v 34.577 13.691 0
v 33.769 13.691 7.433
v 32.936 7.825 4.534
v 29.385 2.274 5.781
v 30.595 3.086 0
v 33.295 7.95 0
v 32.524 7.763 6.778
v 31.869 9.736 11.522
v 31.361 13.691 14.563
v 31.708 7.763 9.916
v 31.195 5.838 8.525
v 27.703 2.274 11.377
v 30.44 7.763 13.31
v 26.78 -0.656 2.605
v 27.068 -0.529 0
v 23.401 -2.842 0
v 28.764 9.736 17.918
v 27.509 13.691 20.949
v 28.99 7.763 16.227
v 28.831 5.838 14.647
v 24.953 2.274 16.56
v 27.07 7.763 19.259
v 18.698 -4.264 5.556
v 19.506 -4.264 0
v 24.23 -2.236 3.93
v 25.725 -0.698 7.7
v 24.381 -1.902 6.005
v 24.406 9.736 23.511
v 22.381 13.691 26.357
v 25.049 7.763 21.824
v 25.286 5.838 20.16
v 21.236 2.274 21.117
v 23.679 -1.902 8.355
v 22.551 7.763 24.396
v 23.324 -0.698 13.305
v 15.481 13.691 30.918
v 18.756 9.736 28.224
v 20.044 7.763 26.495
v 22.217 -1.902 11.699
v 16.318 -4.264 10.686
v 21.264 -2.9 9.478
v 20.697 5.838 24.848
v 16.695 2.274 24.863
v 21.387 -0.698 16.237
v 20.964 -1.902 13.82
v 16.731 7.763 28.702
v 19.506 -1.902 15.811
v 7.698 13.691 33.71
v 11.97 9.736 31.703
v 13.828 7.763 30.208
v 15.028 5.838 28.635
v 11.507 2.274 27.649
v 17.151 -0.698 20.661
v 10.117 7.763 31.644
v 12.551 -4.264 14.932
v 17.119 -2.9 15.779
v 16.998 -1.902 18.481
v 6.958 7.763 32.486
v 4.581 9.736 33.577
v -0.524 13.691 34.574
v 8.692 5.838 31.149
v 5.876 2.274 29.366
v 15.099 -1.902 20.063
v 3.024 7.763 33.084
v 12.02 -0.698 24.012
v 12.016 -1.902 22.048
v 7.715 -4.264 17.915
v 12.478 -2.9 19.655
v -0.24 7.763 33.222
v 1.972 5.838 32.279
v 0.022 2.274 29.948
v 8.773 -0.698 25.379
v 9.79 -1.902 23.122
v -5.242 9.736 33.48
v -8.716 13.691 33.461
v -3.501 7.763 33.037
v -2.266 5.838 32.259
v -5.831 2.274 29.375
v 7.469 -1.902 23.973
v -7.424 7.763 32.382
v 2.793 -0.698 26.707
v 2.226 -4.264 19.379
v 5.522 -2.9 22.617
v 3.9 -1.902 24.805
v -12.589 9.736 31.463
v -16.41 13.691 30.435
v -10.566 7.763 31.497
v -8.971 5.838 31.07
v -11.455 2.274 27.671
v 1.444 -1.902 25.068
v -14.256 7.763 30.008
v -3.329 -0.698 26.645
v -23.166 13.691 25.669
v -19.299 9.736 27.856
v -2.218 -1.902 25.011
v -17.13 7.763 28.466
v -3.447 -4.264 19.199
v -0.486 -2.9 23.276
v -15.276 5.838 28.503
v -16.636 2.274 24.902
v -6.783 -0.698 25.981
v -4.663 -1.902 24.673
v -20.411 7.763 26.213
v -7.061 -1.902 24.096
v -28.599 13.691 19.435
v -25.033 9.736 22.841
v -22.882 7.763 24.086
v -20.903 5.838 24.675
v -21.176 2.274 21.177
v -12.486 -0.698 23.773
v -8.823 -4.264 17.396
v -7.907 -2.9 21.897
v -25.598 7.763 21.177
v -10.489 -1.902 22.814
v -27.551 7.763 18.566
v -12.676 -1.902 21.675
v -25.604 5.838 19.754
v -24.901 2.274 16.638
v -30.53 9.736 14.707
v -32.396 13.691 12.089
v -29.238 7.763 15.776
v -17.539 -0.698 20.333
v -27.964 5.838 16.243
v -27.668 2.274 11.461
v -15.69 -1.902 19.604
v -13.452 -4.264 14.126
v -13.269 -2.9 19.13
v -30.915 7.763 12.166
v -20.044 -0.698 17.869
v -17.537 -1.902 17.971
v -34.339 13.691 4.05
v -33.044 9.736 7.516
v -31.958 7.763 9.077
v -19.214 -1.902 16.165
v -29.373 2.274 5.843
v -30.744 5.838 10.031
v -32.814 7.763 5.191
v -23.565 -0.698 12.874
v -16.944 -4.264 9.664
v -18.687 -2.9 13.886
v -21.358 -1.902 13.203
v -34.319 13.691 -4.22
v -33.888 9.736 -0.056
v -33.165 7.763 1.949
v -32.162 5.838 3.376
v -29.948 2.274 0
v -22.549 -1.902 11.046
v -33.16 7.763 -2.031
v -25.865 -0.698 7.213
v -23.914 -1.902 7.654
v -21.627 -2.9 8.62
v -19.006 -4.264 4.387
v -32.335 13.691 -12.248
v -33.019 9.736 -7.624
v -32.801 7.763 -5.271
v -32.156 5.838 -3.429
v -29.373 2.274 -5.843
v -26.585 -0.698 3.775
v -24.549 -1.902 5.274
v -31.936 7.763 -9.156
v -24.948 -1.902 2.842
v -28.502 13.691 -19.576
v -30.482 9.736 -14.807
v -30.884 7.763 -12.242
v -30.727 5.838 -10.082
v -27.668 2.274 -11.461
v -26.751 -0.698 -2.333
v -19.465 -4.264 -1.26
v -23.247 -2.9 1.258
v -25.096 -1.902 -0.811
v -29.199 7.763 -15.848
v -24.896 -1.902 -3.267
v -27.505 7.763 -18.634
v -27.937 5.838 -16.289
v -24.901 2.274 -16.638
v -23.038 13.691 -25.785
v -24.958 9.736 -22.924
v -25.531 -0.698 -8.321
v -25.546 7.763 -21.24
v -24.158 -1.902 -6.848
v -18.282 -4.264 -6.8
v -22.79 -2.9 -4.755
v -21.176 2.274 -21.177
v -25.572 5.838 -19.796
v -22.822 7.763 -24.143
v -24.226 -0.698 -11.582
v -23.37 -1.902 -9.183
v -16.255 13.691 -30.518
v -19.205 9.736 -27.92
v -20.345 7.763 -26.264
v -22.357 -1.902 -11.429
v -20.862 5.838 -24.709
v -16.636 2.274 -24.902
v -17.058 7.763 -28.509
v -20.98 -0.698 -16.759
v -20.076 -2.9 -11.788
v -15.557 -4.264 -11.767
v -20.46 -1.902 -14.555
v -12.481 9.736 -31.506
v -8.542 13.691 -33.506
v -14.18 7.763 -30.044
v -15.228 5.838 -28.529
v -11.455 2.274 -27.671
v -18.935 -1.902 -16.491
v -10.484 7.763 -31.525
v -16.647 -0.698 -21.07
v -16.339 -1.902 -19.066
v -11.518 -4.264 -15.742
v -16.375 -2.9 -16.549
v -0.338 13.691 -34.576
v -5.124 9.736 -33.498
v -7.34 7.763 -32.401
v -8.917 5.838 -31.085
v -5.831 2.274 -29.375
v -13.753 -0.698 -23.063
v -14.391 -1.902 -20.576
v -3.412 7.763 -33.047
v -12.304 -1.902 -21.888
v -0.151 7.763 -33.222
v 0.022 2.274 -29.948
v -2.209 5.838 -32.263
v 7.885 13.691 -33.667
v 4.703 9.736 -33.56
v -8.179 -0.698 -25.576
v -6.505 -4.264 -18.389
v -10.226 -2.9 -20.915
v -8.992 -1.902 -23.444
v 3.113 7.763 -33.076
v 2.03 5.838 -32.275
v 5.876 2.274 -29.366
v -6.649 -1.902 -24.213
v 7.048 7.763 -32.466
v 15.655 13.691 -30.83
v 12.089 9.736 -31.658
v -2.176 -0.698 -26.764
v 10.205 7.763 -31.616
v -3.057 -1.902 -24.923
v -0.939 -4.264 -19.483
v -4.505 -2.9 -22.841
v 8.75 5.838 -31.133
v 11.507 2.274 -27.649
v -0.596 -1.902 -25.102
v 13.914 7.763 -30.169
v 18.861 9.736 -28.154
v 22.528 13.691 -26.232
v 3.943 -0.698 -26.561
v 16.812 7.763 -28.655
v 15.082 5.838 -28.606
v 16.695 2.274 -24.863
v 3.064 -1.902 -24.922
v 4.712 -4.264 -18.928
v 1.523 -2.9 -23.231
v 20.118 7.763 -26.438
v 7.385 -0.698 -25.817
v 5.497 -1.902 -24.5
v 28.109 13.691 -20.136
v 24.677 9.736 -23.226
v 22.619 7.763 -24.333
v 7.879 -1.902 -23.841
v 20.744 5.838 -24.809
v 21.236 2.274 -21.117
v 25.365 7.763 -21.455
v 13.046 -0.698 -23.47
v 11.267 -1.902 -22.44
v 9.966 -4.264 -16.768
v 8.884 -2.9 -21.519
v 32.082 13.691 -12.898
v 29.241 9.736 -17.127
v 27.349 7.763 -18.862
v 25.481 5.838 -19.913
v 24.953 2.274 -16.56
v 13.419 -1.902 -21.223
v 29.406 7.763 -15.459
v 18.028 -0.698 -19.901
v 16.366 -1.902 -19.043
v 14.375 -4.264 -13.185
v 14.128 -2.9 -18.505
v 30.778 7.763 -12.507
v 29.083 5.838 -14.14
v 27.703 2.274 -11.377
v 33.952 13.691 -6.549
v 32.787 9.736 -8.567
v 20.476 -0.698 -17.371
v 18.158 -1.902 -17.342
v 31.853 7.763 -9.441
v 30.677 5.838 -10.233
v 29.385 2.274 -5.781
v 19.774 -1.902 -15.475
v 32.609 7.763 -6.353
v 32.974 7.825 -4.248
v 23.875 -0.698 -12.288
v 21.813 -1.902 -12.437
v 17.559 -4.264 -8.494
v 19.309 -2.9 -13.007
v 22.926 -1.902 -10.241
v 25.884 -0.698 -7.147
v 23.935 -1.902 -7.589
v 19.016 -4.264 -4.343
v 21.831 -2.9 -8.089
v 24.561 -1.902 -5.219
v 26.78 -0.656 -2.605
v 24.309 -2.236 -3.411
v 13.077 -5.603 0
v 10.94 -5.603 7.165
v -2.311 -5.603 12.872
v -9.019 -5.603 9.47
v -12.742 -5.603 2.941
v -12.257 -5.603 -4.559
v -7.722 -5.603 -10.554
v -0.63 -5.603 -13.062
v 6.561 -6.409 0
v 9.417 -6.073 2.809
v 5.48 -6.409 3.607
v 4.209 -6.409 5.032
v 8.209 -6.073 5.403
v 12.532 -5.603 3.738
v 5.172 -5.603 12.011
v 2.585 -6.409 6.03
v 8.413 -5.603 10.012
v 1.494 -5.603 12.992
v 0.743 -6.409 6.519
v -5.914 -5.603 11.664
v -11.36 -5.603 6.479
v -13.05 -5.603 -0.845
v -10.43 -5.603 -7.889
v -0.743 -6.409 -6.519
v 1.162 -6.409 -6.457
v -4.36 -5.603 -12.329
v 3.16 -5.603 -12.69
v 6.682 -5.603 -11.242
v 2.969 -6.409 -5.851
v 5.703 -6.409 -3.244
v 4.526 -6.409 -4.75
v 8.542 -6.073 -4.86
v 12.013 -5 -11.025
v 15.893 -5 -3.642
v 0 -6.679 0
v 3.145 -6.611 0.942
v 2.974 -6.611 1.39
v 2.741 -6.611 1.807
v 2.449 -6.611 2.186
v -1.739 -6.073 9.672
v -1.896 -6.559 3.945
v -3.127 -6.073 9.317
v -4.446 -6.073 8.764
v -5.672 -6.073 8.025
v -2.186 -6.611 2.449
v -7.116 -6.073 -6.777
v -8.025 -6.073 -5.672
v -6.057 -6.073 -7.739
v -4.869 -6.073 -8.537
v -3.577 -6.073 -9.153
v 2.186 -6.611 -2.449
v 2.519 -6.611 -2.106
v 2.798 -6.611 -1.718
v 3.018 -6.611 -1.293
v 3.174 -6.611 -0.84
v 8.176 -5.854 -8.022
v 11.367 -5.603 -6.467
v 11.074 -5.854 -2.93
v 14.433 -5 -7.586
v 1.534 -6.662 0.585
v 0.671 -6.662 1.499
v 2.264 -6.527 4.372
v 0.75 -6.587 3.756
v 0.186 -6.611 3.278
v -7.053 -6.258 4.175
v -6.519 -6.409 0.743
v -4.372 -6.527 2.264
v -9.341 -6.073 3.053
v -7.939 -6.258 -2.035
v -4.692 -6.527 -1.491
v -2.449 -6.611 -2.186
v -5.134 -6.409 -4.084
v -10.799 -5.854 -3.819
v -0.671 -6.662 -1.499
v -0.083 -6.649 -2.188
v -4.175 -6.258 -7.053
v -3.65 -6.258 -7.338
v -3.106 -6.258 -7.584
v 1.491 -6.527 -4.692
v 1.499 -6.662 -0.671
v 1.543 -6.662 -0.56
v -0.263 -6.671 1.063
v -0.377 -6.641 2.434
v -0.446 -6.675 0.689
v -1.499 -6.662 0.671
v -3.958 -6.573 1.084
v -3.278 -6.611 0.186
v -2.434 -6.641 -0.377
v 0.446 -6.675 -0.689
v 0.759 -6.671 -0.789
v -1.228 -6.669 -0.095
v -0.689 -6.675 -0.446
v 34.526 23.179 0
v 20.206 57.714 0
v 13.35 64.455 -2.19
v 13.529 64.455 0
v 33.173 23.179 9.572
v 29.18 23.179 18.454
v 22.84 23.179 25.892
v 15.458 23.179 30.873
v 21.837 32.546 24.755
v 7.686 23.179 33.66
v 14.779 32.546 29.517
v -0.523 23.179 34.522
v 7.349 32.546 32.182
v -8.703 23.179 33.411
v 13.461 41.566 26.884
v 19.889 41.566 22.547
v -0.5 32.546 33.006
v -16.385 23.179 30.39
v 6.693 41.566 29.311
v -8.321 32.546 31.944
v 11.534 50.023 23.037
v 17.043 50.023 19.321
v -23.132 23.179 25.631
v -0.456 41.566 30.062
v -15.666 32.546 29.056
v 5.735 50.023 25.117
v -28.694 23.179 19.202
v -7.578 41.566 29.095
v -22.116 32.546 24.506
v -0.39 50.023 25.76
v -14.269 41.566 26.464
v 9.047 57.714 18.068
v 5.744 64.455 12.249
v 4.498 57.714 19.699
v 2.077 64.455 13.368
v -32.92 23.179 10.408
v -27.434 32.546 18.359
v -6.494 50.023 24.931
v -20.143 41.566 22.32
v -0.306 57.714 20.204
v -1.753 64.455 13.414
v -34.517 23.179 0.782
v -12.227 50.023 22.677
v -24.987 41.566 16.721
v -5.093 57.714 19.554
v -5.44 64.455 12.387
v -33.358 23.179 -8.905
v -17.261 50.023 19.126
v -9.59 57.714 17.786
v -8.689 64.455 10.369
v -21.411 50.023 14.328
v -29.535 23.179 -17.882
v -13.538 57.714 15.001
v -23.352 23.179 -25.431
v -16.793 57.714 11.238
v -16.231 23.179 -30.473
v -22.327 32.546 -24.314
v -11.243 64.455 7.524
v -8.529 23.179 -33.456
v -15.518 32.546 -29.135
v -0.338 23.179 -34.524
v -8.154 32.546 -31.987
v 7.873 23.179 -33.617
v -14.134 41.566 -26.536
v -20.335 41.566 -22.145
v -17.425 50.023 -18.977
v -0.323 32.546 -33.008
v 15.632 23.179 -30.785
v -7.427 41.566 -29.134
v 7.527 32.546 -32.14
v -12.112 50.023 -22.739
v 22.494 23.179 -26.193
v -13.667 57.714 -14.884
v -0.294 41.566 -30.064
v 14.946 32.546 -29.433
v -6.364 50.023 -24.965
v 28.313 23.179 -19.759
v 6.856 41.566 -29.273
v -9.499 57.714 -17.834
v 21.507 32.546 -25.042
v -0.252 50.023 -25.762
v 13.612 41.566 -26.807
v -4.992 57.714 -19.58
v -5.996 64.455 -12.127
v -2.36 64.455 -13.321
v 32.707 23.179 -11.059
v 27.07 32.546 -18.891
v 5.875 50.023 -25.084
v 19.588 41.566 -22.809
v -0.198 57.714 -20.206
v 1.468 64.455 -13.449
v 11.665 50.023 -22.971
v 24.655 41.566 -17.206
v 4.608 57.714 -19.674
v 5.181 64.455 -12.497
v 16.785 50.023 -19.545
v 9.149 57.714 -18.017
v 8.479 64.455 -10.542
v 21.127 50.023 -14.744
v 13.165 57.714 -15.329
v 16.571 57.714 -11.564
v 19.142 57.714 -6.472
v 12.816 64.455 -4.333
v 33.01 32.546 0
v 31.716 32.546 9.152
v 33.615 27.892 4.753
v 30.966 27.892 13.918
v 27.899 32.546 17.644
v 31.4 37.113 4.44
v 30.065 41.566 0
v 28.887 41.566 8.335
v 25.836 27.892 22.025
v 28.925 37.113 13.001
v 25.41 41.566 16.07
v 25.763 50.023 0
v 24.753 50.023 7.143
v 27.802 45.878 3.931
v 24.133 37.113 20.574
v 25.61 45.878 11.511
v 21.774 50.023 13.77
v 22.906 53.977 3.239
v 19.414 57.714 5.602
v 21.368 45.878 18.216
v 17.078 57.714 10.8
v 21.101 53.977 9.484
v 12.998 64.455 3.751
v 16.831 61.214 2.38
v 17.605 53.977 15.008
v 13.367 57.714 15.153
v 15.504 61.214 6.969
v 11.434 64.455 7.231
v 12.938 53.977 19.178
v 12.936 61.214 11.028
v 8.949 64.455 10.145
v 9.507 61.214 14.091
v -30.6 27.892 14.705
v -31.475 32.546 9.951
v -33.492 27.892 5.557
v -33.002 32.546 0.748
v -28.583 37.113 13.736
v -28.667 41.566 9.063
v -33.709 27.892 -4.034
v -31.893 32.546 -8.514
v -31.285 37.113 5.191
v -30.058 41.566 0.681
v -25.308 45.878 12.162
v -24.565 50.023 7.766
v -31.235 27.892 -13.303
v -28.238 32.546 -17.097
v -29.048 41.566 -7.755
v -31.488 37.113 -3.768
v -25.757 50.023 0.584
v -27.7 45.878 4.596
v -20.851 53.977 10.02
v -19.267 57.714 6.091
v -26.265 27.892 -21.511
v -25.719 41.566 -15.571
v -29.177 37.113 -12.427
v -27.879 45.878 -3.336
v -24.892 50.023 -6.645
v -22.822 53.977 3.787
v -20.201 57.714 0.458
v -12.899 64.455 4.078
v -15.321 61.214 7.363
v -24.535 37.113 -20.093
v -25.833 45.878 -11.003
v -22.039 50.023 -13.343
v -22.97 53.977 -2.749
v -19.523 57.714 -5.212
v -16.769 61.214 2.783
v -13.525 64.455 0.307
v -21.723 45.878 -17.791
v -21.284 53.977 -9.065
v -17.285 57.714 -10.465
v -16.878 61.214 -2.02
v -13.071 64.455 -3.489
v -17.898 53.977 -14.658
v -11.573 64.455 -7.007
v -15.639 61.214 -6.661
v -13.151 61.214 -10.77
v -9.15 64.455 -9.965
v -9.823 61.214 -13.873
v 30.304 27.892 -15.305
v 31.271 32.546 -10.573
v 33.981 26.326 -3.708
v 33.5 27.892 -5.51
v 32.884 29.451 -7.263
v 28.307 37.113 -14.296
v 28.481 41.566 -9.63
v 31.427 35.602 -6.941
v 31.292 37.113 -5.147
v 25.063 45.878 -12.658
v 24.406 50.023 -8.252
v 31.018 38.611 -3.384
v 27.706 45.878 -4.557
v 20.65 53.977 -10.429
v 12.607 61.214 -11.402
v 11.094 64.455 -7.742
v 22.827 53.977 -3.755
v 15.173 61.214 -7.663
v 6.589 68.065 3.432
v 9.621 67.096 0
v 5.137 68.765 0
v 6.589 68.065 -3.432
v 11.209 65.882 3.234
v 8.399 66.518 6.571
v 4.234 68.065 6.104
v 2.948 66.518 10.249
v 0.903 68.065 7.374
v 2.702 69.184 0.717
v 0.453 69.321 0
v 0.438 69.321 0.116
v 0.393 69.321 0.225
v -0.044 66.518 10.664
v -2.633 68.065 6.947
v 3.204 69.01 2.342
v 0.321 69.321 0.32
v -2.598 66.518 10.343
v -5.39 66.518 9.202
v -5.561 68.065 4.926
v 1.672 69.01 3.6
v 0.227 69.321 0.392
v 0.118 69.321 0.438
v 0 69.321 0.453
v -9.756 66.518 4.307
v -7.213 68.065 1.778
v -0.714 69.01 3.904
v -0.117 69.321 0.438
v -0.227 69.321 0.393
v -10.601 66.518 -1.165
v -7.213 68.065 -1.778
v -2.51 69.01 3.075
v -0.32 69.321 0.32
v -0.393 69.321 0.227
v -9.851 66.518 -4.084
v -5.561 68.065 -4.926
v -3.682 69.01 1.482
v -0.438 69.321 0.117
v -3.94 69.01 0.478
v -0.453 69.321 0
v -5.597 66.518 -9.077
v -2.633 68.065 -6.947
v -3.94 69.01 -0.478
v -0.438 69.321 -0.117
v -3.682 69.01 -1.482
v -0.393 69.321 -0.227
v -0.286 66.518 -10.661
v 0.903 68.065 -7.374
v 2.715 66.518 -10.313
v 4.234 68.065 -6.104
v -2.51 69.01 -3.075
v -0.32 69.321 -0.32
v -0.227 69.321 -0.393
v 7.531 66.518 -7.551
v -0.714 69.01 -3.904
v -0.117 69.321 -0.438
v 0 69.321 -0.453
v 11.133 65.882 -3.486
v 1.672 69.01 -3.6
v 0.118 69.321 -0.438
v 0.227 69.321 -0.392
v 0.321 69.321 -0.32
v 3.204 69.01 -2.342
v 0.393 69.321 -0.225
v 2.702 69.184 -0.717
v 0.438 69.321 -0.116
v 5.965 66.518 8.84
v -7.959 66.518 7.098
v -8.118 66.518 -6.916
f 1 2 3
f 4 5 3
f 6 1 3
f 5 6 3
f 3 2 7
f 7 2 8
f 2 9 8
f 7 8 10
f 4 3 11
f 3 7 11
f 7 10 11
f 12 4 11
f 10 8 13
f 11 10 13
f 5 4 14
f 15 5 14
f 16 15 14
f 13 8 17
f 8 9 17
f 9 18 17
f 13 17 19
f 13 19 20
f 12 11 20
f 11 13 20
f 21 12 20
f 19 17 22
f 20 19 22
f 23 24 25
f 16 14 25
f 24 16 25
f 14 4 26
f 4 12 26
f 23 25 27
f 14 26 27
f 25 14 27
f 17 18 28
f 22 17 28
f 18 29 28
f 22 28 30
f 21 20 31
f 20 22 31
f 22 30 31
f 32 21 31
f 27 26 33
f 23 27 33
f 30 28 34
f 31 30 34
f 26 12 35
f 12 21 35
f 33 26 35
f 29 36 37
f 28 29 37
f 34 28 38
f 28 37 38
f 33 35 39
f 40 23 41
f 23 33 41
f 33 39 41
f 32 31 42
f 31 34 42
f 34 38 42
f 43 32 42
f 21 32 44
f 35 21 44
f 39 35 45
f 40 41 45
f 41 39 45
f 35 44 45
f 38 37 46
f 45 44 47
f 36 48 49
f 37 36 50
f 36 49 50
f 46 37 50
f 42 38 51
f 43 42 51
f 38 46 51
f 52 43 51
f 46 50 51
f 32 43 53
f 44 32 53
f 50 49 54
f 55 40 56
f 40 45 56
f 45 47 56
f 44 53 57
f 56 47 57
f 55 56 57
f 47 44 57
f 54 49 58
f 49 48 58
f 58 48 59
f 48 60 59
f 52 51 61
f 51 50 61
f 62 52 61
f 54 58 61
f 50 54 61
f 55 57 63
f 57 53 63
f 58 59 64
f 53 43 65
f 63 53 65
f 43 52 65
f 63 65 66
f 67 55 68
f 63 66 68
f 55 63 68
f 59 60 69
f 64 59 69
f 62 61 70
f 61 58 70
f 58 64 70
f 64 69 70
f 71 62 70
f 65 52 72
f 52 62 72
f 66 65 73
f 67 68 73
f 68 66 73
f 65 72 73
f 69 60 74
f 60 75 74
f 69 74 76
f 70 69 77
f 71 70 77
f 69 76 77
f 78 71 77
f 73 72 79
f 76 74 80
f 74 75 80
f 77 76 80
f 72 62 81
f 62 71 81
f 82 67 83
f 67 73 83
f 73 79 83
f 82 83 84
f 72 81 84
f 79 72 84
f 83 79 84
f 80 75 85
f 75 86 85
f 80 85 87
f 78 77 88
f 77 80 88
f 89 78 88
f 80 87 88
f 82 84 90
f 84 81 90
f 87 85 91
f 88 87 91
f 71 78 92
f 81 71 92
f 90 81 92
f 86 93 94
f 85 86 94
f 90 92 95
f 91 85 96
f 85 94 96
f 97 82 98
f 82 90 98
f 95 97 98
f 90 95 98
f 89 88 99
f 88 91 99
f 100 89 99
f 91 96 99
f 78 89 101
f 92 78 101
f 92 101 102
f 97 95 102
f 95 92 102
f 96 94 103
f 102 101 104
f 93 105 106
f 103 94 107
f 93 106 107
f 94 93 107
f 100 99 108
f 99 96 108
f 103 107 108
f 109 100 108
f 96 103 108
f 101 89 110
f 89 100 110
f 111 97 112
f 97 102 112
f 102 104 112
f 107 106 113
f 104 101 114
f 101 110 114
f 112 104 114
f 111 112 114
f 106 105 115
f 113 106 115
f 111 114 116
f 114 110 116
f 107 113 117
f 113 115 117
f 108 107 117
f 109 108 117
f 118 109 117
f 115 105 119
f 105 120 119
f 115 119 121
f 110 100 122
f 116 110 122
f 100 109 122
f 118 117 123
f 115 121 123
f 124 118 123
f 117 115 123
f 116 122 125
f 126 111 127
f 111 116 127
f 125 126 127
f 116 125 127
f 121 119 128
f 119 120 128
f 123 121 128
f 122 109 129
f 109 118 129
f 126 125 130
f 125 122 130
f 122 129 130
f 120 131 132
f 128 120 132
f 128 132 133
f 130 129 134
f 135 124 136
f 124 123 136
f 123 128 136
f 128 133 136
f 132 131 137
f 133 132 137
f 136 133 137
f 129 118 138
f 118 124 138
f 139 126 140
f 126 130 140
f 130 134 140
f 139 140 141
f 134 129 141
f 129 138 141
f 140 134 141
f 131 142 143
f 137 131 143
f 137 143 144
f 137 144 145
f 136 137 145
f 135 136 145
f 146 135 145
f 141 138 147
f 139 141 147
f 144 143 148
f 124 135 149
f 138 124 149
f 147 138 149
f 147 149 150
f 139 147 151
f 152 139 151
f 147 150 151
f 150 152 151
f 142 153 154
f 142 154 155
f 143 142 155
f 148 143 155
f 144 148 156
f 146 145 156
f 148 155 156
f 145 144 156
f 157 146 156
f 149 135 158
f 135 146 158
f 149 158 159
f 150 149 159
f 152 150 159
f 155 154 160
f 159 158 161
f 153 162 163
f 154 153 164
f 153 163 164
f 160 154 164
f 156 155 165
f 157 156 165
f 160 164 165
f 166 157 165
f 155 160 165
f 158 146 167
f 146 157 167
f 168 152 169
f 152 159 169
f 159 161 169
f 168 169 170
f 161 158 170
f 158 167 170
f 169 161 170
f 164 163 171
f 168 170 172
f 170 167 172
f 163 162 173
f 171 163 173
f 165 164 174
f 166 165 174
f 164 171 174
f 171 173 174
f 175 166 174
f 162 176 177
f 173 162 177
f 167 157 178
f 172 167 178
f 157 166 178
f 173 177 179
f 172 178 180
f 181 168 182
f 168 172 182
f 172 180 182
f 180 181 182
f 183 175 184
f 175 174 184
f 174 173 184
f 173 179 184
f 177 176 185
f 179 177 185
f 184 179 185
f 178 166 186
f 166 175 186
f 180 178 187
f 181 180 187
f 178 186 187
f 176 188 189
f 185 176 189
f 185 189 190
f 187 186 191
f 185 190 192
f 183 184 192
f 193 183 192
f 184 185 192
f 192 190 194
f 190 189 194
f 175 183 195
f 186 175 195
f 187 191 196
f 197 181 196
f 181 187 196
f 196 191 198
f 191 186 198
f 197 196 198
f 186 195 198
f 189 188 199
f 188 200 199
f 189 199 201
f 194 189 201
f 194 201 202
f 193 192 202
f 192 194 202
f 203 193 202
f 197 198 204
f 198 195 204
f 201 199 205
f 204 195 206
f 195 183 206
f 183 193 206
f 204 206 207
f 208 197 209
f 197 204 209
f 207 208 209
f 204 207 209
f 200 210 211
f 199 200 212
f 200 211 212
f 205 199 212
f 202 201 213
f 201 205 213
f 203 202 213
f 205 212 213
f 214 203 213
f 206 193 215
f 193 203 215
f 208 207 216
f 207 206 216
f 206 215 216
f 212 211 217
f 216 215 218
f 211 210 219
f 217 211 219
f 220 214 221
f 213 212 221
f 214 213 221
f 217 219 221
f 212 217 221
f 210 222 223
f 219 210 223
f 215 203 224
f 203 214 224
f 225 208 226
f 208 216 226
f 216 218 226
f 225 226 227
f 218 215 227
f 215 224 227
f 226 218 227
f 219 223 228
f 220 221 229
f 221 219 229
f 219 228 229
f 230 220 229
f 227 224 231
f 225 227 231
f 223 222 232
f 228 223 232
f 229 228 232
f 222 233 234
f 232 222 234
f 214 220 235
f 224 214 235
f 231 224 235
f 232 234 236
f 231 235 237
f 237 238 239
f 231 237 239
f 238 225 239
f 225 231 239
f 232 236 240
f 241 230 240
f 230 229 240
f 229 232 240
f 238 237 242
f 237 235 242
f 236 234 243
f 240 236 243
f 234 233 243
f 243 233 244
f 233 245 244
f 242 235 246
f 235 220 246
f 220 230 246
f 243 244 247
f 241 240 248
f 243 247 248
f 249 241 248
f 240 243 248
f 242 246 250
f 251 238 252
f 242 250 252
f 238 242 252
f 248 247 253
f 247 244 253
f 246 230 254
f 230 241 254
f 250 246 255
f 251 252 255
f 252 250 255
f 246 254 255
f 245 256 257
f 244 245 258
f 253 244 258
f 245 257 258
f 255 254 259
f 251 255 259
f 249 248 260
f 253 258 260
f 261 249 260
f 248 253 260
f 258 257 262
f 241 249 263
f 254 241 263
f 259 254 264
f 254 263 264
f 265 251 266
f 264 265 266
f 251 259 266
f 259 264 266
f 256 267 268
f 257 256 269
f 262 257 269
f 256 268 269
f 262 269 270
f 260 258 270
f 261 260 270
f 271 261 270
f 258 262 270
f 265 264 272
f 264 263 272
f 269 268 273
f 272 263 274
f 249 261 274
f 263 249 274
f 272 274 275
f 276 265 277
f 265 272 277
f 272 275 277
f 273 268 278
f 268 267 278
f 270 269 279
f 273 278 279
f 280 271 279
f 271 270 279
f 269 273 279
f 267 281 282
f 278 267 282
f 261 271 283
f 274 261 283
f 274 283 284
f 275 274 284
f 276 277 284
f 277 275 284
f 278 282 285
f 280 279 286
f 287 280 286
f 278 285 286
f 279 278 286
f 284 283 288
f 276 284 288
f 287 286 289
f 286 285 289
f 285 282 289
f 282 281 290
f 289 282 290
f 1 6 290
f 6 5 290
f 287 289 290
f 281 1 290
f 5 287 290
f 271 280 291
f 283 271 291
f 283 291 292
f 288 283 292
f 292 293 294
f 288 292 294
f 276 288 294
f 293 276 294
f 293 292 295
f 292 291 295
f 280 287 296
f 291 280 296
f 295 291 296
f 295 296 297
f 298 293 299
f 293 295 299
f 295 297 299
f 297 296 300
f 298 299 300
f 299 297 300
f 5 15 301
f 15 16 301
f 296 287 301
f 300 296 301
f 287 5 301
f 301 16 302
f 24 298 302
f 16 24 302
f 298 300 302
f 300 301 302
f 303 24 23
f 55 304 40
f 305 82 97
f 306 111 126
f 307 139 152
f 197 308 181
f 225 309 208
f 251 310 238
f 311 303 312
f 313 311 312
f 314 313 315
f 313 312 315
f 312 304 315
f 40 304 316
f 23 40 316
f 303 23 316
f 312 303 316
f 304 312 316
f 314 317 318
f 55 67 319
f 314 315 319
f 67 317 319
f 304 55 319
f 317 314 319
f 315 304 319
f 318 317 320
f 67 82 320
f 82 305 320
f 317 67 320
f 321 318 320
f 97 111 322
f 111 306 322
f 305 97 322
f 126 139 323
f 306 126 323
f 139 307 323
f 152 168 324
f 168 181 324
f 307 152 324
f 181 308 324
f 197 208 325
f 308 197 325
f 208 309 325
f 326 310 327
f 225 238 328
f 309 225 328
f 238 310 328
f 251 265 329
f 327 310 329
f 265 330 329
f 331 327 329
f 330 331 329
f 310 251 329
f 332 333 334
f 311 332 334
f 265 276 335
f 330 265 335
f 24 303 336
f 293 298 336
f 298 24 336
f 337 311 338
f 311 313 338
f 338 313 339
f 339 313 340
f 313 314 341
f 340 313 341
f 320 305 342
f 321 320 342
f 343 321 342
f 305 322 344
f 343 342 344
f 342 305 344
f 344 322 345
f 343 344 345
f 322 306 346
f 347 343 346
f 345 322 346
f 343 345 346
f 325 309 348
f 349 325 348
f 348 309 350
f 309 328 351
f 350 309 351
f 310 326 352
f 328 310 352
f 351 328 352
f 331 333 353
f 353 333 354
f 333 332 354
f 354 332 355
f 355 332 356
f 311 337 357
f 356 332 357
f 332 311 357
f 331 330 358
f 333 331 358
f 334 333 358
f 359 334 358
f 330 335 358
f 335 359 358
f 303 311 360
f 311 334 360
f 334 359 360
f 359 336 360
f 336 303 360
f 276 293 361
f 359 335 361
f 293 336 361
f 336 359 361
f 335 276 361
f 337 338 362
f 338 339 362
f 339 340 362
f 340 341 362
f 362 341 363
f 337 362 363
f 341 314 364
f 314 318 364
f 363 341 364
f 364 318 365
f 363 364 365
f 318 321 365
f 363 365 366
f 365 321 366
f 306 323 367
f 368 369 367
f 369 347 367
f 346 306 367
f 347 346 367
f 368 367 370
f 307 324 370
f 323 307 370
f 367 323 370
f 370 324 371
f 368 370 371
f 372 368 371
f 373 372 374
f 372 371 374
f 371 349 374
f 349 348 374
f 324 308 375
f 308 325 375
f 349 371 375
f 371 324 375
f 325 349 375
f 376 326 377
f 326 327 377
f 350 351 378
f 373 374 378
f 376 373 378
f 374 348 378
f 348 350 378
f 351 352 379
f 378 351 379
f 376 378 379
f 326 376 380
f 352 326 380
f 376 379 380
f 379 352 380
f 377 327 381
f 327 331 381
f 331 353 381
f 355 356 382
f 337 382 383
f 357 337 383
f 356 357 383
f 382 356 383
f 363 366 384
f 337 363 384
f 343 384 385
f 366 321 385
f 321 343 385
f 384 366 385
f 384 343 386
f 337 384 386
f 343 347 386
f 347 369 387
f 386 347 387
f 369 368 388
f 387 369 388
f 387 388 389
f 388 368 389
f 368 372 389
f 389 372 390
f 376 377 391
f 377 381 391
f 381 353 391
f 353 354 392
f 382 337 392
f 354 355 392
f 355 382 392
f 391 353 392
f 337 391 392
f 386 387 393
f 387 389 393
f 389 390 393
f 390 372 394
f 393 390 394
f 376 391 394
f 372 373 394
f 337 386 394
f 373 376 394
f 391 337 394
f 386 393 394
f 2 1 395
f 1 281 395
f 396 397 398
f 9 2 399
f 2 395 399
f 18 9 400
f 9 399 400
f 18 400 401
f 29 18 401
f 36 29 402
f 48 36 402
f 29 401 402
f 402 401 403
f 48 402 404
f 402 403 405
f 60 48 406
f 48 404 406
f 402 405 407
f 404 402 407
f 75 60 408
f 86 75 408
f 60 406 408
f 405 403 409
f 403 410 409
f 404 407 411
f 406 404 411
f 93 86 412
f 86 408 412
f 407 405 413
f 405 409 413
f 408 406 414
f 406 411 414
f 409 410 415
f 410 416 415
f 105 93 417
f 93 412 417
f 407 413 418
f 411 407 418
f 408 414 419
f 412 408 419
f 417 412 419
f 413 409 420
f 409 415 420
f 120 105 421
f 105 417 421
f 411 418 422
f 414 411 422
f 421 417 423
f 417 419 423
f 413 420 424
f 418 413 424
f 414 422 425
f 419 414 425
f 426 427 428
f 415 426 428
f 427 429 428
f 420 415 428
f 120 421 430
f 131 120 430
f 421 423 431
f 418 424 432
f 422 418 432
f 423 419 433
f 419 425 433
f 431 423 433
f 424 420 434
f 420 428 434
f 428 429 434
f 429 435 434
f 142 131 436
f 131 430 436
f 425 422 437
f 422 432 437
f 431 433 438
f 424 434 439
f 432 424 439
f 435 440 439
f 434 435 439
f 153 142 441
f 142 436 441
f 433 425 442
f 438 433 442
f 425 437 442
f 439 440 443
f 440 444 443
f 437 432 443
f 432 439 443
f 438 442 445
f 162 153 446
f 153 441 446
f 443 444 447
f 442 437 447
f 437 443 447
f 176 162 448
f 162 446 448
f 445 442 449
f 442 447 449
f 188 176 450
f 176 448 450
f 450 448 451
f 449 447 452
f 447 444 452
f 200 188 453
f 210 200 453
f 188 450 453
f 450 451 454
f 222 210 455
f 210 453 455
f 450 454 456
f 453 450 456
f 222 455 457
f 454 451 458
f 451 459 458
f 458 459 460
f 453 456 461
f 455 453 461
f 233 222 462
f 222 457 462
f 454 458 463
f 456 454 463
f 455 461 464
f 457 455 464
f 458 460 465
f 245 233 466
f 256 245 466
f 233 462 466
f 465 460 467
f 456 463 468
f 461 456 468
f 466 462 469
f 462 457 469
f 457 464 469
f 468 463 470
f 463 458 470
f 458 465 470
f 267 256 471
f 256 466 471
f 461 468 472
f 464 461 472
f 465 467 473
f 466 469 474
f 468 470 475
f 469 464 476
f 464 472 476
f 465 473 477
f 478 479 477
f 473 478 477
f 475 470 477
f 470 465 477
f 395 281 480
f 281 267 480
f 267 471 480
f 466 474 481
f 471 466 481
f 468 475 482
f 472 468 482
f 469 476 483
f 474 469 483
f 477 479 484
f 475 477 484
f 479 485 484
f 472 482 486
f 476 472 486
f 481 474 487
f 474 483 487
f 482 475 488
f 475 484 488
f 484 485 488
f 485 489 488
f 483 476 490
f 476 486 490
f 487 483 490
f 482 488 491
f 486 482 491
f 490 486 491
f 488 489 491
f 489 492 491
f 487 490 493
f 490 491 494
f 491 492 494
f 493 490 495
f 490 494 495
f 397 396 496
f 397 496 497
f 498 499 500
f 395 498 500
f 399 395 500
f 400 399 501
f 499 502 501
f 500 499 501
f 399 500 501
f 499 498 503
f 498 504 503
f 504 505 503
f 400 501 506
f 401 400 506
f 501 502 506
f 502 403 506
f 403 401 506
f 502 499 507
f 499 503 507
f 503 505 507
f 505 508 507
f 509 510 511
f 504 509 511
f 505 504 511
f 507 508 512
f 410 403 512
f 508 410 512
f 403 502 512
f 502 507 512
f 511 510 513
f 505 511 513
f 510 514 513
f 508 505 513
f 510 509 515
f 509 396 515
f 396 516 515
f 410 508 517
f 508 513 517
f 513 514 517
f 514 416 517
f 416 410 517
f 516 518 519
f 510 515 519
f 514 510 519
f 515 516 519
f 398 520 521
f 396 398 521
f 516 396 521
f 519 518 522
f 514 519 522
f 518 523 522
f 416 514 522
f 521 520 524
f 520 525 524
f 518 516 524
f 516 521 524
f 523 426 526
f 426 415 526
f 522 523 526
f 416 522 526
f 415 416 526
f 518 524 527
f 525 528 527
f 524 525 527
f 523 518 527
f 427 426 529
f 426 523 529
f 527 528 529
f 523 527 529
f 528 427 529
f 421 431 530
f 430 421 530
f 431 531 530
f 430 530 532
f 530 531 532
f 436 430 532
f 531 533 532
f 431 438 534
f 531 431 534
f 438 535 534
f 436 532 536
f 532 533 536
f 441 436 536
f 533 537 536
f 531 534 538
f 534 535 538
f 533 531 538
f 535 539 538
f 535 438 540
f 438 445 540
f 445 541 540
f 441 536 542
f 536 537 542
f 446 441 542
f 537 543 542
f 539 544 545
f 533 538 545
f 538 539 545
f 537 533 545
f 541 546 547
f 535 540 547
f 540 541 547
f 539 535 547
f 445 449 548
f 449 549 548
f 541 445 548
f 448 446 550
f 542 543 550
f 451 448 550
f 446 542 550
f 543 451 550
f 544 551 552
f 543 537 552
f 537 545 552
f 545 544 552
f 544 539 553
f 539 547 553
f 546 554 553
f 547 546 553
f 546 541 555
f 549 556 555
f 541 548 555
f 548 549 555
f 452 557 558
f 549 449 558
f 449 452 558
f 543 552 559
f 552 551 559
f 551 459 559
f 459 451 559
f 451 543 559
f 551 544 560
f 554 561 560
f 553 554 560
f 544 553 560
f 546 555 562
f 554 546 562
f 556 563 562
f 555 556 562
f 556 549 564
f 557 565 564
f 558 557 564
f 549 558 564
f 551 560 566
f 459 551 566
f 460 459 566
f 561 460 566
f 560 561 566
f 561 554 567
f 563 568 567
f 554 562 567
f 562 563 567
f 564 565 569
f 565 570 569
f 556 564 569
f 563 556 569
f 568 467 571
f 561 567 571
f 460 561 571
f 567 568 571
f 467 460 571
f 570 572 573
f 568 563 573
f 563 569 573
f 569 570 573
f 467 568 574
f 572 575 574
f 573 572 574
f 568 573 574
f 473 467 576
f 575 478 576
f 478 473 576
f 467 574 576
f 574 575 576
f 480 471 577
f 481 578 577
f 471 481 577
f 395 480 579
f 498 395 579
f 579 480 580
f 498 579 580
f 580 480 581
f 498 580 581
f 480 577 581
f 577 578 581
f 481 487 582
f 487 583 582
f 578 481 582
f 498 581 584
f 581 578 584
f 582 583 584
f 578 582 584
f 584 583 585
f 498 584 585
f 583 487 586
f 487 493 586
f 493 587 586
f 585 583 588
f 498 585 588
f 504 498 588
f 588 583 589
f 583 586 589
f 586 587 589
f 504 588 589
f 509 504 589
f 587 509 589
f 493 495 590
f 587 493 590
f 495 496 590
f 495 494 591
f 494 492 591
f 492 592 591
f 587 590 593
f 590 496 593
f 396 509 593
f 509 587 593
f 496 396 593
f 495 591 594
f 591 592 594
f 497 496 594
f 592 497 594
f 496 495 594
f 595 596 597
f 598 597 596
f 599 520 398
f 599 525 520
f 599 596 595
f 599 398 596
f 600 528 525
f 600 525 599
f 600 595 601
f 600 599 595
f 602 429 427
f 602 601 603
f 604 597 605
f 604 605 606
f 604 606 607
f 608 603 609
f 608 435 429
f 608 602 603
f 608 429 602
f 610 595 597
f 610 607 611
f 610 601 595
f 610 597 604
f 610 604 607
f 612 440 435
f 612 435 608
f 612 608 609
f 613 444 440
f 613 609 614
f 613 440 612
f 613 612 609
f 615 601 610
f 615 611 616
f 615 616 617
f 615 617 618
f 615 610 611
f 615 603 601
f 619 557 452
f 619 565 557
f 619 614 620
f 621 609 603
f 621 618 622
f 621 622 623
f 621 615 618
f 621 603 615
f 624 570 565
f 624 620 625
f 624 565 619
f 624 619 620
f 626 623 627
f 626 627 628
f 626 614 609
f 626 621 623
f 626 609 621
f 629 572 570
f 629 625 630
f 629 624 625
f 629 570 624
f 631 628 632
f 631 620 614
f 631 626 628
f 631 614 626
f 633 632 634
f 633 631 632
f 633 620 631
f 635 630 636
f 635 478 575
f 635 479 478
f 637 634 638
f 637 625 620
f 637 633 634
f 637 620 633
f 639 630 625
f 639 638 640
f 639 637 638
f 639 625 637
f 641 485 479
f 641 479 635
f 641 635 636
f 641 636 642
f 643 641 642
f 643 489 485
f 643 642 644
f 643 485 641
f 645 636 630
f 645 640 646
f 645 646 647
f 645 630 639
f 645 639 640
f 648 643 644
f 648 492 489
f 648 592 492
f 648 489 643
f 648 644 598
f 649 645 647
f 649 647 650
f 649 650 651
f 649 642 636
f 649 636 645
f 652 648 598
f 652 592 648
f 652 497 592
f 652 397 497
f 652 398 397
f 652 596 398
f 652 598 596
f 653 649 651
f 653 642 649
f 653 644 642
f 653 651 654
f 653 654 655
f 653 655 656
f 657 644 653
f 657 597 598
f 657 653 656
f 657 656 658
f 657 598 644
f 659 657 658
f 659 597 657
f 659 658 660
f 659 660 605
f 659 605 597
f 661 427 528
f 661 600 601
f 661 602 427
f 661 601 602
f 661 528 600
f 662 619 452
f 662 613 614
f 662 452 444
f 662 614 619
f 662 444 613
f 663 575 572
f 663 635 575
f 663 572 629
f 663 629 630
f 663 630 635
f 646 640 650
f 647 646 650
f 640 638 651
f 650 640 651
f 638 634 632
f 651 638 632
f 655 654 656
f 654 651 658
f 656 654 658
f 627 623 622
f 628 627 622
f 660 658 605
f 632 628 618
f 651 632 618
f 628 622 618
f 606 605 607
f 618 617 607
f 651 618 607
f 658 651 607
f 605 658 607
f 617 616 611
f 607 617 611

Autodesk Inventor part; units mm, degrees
ref_plane "YZ Plane" through (0, 0, 0) normal (1, 0, 0) x (0, 1, 0)
ref_plane "XZ Plane" through (0, 0, 0) normal (0, 1, 0) x (-1, 0, 0)
ref_plane "XY Plane" through (0, 0, 0) normal (0, 0, 1) x (1, 0, 0)
sketch "Sketch1" plane through (0, 0, 0) normal (0, 0, 1) x (1, 0, 0)
  line L0 (0, 0) -> (32, 0)
  line L1 (0, 0) -> (-32, 0)
  arc A0 (0, -6.6788) -> (32, 0) centre (0, 73.3212) ccw
  arc A1 (32, 0) -> (7.0818, 69.3212) centre (-26.5172, 18.1046) ccw
  line L2 (0, 69.3212) -> (0, -6.6788)
  line L3 (0, 69.3212) -> (7.0818, 69.3212)
  dimension "d0" = 32
  dimension "d1" = 32
  dimension "d2" = 80
  dimension "d3" = 4
revolve "Revolution1" add sketch "Sketch1" angle 360 about axis through (0, 69.3212, 0) along (0, -1, 0)
fillet "Fillet1" radius 20 1 edges at (-32, 0, 0)
fillet "Fillet2" radius 20 1 edges at (-7.0818, 69.3212, 0)
properties part number "shell_front"
